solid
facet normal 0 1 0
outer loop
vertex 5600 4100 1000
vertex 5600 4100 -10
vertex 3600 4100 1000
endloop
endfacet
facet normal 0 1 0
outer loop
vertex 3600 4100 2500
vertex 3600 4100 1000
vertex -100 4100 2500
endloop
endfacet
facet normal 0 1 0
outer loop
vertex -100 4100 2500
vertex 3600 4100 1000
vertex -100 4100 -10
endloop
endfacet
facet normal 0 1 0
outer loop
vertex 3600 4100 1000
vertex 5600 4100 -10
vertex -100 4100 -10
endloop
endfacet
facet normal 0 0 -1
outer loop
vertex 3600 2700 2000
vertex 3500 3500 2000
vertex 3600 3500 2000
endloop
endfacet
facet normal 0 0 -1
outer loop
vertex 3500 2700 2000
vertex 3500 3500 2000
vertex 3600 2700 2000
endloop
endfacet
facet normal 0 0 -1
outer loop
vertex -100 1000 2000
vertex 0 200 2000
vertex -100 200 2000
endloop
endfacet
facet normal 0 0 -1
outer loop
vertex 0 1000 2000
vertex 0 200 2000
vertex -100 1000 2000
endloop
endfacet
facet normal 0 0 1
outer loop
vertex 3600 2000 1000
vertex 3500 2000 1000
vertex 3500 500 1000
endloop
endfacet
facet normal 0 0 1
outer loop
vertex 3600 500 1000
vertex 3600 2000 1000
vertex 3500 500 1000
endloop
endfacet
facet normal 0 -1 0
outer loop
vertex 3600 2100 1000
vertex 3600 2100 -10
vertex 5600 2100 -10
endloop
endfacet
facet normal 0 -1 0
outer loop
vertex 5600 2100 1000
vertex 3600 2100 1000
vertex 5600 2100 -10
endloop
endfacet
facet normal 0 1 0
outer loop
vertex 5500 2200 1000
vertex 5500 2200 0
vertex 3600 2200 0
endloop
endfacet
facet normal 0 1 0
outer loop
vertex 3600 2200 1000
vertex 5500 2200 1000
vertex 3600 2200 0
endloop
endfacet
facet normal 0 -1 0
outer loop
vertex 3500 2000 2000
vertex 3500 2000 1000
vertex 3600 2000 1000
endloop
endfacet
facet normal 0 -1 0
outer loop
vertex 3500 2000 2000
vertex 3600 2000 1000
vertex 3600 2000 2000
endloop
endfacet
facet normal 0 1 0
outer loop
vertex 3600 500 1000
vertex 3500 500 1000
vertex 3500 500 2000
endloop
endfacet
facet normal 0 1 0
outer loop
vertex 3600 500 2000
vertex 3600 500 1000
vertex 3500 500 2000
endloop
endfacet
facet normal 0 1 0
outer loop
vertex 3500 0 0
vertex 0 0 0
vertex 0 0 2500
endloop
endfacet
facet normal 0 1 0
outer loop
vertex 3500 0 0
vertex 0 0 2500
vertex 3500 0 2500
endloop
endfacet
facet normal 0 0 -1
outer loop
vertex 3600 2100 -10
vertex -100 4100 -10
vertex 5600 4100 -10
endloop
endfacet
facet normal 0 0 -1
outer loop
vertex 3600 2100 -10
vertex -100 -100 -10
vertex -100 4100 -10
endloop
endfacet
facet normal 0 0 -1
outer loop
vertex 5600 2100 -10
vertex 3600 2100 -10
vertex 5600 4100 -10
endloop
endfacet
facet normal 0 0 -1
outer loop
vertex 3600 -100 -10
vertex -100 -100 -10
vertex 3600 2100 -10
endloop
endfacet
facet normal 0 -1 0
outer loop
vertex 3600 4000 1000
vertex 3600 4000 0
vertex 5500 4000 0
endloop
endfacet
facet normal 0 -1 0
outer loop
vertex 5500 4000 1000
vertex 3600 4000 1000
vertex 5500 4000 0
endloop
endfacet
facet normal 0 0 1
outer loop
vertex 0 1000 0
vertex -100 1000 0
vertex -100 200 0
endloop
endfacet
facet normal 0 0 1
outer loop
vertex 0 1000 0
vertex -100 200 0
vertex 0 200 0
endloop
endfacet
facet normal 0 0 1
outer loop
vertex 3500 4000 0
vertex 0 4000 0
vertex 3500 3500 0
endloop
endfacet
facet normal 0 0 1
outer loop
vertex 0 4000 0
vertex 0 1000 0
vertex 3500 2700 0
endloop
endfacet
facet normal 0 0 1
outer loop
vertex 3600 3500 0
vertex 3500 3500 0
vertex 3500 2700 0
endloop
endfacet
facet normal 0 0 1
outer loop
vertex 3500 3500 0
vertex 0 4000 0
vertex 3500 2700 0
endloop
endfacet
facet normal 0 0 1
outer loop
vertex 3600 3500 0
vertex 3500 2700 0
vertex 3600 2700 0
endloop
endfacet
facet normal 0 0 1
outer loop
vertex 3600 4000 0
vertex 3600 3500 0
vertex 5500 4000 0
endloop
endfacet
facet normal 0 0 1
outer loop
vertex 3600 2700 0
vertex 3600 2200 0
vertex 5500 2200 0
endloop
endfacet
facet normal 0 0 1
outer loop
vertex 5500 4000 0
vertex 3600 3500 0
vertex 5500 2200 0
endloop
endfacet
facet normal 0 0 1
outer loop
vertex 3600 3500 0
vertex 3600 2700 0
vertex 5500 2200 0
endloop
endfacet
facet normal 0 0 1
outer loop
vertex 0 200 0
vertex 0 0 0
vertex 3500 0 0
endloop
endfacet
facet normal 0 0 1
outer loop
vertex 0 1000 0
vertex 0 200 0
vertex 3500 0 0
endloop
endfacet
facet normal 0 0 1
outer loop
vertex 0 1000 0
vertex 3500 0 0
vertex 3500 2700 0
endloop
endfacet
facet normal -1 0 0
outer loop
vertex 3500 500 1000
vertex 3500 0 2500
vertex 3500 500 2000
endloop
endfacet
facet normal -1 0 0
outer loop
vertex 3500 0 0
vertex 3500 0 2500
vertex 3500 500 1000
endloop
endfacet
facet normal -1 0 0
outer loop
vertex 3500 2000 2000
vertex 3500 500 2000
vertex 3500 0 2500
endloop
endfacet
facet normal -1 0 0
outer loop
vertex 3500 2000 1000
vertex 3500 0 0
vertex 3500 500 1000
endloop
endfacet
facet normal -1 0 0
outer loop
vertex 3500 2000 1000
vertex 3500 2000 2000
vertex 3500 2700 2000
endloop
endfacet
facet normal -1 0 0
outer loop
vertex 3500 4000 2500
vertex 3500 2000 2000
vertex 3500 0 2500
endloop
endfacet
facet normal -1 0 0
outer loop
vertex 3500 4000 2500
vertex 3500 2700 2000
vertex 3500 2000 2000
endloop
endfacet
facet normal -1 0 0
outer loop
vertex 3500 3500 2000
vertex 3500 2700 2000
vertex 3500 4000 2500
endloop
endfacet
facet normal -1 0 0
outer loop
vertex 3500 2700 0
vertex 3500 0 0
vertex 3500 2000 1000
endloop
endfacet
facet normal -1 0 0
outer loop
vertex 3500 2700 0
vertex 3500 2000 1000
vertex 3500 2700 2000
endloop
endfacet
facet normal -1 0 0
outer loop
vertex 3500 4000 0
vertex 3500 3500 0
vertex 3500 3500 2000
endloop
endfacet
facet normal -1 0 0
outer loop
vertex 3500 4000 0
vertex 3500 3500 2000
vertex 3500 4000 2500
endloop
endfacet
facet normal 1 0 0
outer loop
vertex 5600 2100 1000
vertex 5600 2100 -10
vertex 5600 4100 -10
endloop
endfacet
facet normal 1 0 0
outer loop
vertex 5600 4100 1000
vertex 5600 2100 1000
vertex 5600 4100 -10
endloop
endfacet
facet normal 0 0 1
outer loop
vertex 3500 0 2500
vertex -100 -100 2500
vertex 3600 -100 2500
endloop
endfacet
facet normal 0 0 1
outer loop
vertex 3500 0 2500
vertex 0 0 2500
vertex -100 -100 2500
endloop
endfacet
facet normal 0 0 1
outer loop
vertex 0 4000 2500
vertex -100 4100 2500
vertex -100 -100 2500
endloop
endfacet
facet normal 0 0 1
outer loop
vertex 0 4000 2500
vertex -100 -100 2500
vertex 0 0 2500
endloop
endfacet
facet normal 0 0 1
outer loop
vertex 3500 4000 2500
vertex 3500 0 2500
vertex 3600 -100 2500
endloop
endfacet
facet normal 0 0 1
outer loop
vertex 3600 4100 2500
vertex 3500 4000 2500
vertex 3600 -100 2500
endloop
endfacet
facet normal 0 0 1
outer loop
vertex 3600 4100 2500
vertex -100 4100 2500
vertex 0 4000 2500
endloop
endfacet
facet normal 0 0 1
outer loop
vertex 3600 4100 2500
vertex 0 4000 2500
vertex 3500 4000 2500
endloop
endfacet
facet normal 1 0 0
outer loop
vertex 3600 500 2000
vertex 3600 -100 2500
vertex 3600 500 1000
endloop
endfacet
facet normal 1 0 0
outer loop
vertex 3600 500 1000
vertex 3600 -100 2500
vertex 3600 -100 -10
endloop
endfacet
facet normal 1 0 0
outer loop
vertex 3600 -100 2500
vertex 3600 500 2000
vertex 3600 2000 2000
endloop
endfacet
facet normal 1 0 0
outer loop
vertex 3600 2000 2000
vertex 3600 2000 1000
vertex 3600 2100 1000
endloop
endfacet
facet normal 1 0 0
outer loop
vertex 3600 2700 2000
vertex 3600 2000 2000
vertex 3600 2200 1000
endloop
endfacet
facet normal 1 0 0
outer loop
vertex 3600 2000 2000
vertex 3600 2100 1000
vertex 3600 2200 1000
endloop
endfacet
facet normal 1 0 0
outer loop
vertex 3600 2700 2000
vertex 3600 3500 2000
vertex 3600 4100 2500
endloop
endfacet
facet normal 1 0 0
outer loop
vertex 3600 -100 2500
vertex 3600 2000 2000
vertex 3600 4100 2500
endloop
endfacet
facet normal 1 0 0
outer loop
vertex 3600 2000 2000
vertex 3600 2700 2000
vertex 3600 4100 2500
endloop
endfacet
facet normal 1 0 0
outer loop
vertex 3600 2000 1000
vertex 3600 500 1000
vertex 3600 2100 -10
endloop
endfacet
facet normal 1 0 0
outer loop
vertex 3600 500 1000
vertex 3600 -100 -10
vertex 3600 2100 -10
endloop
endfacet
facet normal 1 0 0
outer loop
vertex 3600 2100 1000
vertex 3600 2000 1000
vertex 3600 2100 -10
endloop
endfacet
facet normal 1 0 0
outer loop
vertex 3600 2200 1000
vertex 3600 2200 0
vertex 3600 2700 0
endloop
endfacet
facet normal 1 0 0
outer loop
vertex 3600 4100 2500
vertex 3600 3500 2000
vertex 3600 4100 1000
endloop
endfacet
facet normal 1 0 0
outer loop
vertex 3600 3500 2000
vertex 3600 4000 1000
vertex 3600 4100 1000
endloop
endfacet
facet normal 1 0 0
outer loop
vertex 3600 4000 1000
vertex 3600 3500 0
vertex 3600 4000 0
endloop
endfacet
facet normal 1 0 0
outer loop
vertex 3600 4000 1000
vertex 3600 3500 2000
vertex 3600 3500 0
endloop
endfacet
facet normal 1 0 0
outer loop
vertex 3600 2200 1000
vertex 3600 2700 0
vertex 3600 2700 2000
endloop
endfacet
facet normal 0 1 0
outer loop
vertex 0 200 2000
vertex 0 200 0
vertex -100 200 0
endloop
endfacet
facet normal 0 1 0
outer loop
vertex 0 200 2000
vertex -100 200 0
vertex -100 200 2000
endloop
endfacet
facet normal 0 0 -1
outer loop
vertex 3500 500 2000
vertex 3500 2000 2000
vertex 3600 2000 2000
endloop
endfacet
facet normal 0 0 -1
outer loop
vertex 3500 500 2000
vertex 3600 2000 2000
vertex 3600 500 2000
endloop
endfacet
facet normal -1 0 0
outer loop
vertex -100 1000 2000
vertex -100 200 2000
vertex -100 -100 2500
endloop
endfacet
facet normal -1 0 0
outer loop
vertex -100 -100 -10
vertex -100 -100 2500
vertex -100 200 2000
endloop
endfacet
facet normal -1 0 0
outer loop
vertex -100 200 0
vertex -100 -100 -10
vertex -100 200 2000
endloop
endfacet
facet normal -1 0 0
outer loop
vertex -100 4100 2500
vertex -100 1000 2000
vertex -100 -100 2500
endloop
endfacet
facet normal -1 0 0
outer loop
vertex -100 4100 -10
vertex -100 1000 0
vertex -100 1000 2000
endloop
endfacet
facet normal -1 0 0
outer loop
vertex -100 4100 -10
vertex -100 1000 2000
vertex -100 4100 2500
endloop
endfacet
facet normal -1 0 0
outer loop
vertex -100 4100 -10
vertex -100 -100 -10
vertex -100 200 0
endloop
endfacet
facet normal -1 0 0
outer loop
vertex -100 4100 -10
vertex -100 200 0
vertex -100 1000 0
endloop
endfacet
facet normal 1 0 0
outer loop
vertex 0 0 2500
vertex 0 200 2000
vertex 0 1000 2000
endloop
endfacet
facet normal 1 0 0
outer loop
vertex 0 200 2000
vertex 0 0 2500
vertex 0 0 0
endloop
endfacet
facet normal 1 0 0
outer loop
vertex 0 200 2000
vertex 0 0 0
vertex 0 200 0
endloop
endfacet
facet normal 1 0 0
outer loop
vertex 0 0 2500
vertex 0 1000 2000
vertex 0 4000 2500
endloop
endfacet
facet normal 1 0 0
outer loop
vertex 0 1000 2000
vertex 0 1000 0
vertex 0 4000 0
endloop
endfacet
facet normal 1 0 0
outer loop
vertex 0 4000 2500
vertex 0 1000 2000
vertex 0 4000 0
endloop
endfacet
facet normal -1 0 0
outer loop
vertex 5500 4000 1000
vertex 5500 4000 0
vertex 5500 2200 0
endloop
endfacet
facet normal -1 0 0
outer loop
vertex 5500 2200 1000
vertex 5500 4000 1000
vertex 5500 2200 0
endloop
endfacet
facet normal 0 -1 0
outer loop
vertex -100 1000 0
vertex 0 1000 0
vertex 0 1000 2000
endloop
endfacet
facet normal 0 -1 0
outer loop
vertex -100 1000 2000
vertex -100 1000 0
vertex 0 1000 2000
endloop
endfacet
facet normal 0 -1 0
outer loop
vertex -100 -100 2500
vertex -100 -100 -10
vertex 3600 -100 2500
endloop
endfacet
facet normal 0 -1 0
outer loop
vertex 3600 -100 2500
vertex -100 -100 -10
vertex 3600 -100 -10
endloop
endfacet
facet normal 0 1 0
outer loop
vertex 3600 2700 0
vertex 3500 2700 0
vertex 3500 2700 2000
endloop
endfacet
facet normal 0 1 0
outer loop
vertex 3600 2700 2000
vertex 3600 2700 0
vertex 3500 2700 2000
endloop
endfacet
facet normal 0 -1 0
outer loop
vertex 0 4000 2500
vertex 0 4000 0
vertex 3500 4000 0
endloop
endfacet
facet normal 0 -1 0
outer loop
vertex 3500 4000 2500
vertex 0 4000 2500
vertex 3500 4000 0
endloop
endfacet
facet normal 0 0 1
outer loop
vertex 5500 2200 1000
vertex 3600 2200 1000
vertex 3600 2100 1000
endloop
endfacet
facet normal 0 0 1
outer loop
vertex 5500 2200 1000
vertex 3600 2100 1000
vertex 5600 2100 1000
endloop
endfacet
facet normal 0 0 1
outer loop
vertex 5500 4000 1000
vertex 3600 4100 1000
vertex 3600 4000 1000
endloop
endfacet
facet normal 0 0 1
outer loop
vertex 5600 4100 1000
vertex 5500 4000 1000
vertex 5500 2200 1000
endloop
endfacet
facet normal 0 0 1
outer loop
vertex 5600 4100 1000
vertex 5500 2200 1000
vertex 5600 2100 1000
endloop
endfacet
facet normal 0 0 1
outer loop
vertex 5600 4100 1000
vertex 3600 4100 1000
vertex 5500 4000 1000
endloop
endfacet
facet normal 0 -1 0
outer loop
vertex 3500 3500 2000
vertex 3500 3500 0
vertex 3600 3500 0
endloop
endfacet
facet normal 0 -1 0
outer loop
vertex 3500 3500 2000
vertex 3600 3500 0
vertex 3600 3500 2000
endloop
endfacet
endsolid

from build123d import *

# Parameters (mm, degrees)
F0_W      = 3700
F0_H      = 4200
F1_DEPTH  = 10
F2_W      = 3700
F2_H      = 4200
F2_W_2    = 3500
F2_H_2    = 4000
F3_DEPTH  = 2500
F4_W      = 800
F4_H      = 2000
F5_DEPTH  = 100
F6_W      = 800
F6_H      = 2000
F7_DEPTH  = 100
F8_W      = 2000
F8_H      = 2000
F9_DEPTH  = 10
F11_DEPTH = 1000
F12_W     = 1500
F12_H     = 1000
F13_DEPTH = 100


with BuildPart() as f1:
    # F0 (on Top) → F1 (new body)
    with BuildSketch(Plane.XY):
        with Locations((1750, 2000)):
            Rectangle(F0_W, F0_H)
    extrude(amount=-F1_DEPTH)

    # F2 (on face) → F3 (join)
    with BuildSketch(Plane.XY):
        with Locations((1750, 2000)):
            Rectangle(F2_W, F2_H)
        with Locations((1750, 2000)):
            Rectangle(F2_W_2, F2_H_2, mode=Mode.SUBTRACT)
    extrude(amount=F3_DEPTH)

    # F4 (on face) → F5 (cut, through all)
    with BuildSketch(Plane.YZ):
        with Locations((600, 1000)):
            Rectangle(F4_W, F4_H)
    extrude(amount=-F5_DEPTH, mode=Mode.SUBTRACT)

    # F6 (on face) → F7 (cut, through all)
    with BuildSketch(Plane(origin=(3500, 0, 0), x_dir=(0, -1, 0), z_dir=(-1, 0, 0))):
        with Locations((-3100, 1000)):
            Rectangle(F6_W, F6_H)
    extrude(amount=-F7_DEPTH, mode=Mode.SUBTRACT)

    # F8 (on face) → F9 (join, through all)
    with BuildSketch(Plane(origin=(0, 0, -10), x_dir=(1, 0, 0), z_dir=(0, 0, -1))):
        with Locations((4600, -3100)):
            Rectangle(F8_W, F8_H)
    extrude(amount=-F9_DEPTH)

    # F10 (on face) → F11 (join)
    with BuildSketch(Plane.XY):
        Polygon((5600, 4100), (3600, 4100), (3600, 4000), (5500, 4000), (5500, 2200), (3600, 2200), (3600, 2100), (5600, 2100), align=None)
    extrude(amount=F11_DEPTH)

    # F12 (on face) → F13 (cut, through all)
    with BuildSketch(Plane(origin=(3500, 0, 0), x_dir=(0, -1, 0), z_dir=(-1, 0, 0))):
        with Locations((-1250, 1500)):
            Rectangle(F12_W, F12_H)
    extrude(amount=-F13_DEPTH, mode=Mode.SUBTRACT)


solid = f1.part
